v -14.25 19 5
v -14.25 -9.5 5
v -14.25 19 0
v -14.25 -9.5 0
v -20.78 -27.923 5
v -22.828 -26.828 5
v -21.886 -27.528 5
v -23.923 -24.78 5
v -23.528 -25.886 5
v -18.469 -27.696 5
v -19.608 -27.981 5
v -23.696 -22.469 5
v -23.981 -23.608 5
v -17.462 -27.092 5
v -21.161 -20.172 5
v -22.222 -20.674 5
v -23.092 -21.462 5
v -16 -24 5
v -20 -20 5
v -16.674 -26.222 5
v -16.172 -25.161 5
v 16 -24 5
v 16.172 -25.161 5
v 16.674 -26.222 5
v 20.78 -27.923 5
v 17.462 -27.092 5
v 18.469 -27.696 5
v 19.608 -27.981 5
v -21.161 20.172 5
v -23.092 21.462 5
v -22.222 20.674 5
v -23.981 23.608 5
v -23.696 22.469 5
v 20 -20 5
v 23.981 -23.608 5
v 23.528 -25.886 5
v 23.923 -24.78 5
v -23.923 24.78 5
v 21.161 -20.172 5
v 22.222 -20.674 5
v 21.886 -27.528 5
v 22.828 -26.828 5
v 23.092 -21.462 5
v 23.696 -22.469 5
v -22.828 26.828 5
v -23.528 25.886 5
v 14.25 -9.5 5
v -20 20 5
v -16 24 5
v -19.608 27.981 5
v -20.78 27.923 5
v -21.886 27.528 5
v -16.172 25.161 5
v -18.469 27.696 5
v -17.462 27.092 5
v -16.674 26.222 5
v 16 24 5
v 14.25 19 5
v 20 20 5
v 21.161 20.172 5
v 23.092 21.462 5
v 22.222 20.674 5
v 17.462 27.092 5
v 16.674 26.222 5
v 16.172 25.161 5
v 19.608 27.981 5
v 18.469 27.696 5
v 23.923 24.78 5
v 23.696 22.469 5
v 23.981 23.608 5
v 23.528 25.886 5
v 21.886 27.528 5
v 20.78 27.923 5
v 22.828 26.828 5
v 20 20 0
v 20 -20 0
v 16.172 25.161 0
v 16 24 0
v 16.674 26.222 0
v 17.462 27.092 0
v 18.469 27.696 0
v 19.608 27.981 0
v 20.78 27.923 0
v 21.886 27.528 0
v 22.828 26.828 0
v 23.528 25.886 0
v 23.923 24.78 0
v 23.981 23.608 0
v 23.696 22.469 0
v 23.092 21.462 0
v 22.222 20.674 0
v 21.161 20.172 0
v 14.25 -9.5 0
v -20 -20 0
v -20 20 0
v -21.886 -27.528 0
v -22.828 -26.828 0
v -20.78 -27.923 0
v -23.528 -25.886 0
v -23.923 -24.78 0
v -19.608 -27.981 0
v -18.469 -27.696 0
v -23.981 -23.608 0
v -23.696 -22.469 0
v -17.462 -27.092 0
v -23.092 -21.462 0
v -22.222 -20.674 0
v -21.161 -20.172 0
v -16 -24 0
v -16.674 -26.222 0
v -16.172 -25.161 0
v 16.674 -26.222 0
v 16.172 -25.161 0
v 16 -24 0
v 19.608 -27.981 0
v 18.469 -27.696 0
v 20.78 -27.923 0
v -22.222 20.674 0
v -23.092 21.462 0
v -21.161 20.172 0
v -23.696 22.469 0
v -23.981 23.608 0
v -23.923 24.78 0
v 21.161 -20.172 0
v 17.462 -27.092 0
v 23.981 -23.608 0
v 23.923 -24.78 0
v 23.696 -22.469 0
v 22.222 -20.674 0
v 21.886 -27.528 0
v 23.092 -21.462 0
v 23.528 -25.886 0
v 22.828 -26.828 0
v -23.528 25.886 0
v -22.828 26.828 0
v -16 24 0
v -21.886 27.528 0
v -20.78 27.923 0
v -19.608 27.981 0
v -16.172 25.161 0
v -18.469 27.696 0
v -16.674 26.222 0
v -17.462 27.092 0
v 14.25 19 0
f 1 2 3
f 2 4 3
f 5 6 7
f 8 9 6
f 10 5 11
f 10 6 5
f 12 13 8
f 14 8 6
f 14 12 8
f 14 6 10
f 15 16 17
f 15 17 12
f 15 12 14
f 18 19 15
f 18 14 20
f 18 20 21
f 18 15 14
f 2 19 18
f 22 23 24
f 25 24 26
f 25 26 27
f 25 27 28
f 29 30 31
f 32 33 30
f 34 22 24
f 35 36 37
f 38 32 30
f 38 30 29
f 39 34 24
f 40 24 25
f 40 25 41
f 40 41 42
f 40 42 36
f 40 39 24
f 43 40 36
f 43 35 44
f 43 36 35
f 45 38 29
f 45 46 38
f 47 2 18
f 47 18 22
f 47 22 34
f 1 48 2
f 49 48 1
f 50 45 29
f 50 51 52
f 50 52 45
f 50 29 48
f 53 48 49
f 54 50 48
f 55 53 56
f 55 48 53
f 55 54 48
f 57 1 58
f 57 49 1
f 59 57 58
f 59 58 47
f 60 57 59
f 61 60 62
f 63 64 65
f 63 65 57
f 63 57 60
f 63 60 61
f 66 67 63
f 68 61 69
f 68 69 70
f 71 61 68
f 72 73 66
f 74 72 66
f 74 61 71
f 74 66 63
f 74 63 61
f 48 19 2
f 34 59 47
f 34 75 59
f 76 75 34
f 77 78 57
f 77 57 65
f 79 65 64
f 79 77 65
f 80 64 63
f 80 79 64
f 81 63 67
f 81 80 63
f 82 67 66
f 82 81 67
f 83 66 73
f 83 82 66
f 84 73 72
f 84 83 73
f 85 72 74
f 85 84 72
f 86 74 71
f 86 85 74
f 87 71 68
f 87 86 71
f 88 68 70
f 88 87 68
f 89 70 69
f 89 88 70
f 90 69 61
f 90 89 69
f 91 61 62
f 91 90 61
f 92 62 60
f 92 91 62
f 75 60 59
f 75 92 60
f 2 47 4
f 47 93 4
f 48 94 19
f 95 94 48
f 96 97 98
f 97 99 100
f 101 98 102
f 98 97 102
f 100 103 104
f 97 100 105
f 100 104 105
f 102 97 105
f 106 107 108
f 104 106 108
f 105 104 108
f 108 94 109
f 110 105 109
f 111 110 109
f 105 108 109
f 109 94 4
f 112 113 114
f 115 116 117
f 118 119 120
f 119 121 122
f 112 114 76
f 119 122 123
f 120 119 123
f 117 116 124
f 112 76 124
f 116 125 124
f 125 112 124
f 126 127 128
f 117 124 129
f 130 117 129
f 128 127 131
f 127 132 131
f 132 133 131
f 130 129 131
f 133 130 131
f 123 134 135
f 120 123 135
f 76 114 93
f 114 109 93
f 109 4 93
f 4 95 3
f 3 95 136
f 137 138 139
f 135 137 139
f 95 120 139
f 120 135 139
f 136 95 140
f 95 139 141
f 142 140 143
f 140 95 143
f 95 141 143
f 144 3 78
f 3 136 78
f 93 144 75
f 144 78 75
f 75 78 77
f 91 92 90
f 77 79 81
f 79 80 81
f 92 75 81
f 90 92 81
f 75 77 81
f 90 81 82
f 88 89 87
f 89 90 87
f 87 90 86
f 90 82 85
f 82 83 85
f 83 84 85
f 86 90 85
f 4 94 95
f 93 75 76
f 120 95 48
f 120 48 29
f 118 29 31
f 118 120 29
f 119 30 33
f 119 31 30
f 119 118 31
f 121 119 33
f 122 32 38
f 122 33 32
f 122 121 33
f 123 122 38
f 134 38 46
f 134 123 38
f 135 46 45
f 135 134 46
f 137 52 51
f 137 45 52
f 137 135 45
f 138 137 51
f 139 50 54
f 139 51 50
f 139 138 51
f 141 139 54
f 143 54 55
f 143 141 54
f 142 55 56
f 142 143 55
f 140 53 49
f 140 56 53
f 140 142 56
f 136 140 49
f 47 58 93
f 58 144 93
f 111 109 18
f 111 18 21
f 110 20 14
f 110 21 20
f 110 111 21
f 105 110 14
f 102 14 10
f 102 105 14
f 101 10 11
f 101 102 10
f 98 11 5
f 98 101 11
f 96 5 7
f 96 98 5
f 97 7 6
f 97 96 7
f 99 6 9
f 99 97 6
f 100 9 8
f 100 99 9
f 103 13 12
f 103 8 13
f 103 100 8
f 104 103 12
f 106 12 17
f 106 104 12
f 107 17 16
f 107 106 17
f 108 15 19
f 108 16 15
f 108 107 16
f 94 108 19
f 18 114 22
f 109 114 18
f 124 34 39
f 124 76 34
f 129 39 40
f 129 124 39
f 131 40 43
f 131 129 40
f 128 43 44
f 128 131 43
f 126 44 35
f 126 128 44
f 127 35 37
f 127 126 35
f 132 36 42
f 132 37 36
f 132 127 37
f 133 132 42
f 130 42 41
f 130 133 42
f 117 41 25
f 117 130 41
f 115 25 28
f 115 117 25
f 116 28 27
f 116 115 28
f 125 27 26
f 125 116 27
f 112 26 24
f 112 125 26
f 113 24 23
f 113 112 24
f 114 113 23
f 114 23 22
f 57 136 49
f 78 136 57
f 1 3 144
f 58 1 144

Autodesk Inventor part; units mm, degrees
ref_plane "YZ Plane" through (0, 0, 0) normal (1, 0, 0) x (0, 1, 0)
ref_plane "XZ Plane" through (0, 0, 0) normal (0, 1, 0) x (-1, 0, 0)
ref_plane "XY Plane" through (0, 0, 0) normal (0, 0, 1) x (1, 0, 0)
sketch "Sketch1" plane through (0, 0, 0) normal (0, 0, 1) x (1, 0, 0)
  line L0 (-20, 24) -> (20, 24)
  line L1 (20, 24) -> (20, -24)
  line L2 (20, -24) -> (-20, -24)
  line L3 (-20, -24) -> (-20, 24)
  line L4 (-14.25, 19) -> (14.25, 19)
  line L5 (14.25, 19) -> (14.25, -9.5)
  line L6 (14.25, -9.5) -> (-14.25, -9.5)
  line L7 (-14.25, -9.5) -> (-14.25, 19)
  circle A0 centre (-20, 24) radius 4
  circle A1 centre (20, 24) radius 4
  circle A2 centre (20, -24) radius 4
  circle A3 centre (-20, -24) radius 4
  point P0 (20, 0)
  point P1 (0, 24)
  point P2 (0, 0)
  point P3 (-20, 0)
  point P4 (0, 19)
  dimension "d0" = 40
  dimension "d1" = 48
  dimension "d3" = 5
  dimension "d4" = 28.5
  dimension "d5" = 28.5
  dimension "d8" = 8
  dimension "d9" = 8
  dimension "d10" = 8
  dimension "d11" = 8
extrude "Extrusion1" add sketch "Sketch1" along normal blind 5
properties part number "cubierta OLED"
